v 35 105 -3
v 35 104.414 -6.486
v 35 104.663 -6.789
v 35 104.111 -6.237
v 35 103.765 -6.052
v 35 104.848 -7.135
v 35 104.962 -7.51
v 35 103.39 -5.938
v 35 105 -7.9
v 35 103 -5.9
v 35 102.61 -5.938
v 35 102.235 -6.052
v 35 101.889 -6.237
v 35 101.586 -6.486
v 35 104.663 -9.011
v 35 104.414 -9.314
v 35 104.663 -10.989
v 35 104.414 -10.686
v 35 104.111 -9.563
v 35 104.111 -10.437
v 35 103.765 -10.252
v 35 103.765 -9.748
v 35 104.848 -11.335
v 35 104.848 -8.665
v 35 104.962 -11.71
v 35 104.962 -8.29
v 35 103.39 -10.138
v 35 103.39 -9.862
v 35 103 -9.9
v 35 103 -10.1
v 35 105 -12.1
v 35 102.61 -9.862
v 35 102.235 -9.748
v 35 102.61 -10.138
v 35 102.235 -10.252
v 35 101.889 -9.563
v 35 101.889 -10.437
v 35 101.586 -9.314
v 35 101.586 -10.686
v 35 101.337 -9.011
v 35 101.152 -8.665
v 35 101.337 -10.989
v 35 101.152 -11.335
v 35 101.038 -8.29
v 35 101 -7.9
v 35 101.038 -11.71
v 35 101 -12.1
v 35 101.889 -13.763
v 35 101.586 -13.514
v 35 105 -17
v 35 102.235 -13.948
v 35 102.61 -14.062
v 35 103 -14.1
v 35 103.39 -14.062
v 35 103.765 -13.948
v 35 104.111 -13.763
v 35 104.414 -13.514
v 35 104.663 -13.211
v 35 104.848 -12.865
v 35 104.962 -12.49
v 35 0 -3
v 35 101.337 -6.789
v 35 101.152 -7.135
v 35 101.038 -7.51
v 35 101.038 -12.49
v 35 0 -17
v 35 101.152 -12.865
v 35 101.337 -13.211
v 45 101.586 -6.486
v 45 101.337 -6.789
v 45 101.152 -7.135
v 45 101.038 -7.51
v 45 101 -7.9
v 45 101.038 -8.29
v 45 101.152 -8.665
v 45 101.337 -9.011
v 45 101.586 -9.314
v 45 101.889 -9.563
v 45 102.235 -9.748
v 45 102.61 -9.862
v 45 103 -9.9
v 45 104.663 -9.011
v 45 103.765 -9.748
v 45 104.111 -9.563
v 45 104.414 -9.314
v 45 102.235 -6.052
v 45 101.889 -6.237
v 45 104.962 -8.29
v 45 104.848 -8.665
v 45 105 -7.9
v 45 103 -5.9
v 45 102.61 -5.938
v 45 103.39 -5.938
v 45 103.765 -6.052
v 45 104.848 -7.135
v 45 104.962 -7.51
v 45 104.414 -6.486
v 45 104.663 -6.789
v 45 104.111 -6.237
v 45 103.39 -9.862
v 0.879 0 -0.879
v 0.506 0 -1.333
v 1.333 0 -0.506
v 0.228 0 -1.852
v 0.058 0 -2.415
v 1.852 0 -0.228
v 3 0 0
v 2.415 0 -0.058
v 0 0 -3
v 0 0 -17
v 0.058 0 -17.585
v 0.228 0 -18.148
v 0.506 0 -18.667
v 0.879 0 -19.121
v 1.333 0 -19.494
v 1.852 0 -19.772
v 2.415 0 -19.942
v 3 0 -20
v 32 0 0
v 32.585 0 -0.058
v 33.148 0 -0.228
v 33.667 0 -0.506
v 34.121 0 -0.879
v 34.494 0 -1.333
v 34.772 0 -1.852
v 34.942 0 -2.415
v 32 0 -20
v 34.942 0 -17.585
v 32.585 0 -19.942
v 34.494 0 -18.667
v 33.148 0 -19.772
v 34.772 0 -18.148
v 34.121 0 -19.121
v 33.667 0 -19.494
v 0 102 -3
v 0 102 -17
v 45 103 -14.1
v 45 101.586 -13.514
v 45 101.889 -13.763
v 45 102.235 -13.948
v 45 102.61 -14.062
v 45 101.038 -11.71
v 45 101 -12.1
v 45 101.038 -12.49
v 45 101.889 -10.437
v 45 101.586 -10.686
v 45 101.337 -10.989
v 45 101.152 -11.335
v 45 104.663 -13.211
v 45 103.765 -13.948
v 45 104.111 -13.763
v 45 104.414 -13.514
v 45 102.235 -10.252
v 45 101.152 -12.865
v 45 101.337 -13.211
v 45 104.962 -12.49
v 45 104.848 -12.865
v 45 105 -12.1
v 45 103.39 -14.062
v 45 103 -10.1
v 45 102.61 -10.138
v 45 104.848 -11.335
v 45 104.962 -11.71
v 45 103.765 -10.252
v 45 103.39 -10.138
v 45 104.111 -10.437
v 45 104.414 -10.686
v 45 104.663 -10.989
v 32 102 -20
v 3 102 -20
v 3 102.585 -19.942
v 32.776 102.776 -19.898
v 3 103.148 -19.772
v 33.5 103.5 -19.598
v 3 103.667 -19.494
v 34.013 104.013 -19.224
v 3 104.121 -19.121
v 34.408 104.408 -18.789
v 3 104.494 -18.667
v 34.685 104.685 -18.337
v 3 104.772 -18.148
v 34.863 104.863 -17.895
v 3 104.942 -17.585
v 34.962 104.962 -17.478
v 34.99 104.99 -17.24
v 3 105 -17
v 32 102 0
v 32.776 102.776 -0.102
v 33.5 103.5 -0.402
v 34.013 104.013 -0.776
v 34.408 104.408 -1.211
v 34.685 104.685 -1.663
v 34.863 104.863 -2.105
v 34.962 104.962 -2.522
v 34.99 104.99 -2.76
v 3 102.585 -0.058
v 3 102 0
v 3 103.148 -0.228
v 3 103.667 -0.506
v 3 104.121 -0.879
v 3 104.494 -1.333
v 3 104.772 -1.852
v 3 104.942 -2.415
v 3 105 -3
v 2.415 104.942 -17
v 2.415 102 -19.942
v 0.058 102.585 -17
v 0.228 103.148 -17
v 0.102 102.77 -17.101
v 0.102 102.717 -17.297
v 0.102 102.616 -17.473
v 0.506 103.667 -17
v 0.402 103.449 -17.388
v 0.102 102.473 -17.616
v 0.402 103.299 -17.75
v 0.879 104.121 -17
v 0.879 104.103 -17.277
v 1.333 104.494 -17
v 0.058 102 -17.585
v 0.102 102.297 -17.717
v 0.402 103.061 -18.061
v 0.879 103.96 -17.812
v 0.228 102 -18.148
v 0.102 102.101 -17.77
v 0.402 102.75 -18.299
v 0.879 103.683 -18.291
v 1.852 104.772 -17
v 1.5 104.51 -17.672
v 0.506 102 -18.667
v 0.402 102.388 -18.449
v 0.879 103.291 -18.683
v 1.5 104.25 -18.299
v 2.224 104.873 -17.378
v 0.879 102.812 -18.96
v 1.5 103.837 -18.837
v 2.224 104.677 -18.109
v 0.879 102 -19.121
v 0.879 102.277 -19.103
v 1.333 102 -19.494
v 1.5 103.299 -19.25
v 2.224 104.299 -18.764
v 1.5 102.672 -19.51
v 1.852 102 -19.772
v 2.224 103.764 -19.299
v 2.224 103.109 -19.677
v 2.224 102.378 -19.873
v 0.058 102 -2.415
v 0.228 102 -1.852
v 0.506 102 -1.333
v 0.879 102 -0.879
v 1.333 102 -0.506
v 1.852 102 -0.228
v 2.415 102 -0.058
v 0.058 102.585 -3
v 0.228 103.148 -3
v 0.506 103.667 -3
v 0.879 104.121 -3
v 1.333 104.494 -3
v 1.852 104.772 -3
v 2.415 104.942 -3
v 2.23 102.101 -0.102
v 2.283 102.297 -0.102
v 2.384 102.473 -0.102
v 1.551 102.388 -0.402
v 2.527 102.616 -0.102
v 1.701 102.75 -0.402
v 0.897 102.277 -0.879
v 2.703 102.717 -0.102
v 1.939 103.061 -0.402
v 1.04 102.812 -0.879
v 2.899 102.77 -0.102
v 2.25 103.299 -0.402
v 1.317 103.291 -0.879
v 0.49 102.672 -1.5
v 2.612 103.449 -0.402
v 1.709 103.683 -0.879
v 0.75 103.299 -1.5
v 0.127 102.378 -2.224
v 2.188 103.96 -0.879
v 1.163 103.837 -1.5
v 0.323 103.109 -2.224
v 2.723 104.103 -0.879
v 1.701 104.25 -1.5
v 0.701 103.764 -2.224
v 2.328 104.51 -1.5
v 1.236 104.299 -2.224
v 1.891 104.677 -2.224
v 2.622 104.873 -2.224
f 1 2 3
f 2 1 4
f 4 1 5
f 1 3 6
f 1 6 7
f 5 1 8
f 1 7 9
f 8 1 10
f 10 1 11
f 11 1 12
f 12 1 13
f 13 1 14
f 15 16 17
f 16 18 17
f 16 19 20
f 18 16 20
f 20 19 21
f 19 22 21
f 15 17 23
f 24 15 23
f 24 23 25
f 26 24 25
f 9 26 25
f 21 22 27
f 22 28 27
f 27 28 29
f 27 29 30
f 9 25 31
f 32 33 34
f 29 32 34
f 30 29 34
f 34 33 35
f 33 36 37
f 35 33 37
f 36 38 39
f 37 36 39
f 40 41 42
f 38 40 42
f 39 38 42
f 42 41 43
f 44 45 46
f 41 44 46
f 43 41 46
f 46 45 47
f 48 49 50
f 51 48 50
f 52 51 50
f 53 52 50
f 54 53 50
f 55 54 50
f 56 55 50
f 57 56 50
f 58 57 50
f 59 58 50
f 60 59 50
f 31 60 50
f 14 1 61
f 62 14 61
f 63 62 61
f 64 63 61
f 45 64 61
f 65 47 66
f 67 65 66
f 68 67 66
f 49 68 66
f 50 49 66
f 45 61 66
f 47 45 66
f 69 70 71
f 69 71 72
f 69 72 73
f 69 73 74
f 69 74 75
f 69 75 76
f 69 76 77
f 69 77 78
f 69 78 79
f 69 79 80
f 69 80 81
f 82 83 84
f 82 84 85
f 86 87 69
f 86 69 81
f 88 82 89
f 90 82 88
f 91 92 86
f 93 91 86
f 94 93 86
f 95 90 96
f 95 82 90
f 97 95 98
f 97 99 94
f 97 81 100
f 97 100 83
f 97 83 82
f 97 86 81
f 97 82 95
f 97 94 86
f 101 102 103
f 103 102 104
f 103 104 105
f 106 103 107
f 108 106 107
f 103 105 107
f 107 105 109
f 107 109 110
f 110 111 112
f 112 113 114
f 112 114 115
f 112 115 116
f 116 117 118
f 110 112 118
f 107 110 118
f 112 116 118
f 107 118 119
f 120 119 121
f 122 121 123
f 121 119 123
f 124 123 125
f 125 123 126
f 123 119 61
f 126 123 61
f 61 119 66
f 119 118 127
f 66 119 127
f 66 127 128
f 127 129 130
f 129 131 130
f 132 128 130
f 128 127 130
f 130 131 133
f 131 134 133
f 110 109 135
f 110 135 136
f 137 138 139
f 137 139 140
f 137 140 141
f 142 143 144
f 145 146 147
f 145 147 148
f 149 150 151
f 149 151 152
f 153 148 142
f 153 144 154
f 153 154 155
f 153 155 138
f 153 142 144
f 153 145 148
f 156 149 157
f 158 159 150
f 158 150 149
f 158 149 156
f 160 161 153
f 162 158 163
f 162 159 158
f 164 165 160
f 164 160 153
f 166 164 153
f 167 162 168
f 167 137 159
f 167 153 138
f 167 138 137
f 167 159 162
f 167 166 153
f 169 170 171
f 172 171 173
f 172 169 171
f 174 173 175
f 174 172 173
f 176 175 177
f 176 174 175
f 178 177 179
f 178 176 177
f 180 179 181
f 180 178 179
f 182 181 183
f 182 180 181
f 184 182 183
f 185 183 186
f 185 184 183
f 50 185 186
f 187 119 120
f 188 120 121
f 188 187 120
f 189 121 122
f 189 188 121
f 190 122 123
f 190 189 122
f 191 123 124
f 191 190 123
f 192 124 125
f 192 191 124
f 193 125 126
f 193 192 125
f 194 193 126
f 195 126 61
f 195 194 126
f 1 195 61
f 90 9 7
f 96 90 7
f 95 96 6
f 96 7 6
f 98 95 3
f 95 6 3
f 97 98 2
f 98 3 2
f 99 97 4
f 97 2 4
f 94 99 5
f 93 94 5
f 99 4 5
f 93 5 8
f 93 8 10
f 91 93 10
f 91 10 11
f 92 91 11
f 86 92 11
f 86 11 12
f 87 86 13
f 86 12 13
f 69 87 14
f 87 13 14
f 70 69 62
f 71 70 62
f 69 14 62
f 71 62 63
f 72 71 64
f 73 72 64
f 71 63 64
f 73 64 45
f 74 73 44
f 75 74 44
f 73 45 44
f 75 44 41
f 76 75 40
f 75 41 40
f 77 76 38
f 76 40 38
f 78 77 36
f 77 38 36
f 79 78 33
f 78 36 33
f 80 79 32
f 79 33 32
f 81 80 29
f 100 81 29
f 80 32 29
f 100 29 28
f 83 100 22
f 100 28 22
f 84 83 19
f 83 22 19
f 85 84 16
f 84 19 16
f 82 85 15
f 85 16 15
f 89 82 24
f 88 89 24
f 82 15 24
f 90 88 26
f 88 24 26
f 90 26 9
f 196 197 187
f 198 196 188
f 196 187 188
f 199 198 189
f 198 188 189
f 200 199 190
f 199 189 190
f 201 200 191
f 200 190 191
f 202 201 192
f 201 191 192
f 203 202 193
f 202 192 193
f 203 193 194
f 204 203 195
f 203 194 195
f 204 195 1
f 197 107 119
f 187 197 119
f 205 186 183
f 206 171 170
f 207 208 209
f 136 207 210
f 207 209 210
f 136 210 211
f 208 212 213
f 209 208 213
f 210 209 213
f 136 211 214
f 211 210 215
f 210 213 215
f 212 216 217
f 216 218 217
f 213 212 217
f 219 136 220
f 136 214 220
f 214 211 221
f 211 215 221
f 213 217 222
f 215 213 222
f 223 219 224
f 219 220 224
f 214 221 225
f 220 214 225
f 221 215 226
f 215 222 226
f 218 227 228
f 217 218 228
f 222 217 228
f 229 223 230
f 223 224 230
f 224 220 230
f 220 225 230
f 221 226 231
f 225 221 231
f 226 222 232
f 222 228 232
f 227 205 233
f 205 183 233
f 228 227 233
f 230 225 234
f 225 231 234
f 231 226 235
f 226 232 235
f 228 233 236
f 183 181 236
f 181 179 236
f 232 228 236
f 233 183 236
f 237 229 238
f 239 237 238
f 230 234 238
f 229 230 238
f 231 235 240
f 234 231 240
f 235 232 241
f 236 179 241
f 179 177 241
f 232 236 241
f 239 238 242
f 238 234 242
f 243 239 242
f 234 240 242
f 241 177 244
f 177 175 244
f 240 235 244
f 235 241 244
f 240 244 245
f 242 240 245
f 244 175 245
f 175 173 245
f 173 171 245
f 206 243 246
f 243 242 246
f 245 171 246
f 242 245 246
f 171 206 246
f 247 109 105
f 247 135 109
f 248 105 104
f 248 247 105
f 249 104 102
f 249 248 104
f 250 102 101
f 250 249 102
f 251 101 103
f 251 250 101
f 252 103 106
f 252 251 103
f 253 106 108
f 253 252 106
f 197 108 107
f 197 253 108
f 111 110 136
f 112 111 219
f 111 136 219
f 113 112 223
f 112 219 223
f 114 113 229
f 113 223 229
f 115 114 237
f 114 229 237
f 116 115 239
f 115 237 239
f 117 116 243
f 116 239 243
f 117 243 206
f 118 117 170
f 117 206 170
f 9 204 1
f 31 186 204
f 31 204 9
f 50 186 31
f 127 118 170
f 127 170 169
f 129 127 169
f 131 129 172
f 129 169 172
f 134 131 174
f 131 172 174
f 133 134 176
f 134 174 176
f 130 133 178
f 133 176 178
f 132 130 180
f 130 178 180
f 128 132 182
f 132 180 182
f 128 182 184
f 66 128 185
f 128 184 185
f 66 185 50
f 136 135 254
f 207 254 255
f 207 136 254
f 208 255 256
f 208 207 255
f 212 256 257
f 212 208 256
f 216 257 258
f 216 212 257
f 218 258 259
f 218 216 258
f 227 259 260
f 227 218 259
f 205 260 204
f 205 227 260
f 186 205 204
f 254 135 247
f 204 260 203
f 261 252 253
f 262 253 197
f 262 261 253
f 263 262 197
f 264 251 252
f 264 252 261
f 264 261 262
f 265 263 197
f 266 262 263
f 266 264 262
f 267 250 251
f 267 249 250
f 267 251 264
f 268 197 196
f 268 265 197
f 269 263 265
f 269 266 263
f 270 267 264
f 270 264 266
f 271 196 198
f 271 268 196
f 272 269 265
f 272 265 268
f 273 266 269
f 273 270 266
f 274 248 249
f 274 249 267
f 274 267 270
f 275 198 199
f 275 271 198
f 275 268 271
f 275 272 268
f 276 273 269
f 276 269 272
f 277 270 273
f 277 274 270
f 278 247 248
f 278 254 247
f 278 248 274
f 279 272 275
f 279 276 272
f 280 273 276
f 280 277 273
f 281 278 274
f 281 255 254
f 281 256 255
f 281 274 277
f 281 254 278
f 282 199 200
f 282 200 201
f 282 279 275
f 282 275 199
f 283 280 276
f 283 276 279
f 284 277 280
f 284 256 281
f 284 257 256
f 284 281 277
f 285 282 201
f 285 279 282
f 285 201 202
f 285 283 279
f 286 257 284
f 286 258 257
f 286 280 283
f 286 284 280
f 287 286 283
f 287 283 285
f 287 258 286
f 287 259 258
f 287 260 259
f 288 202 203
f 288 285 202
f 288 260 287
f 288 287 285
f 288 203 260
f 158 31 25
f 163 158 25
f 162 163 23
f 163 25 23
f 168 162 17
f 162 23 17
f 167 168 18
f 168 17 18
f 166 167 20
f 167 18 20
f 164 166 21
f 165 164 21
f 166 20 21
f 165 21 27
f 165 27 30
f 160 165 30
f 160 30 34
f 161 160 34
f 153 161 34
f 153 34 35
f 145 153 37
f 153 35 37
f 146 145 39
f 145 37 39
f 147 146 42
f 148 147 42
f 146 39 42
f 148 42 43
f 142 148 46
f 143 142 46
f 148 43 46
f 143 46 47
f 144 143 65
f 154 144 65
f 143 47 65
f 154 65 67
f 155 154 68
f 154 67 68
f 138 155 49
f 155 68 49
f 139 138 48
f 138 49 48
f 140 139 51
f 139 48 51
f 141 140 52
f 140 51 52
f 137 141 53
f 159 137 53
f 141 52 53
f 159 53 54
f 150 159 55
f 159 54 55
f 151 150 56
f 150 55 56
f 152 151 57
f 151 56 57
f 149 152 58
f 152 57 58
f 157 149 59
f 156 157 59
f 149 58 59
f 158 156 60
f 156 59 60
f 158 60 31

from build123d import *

# Parameters (mm, degrees)
SKETCH2_W           = 35
SKETCH2_H           = 20
BOSS_EXTRUDE1_DEPTH = 105
SKETCH5_R           = 2
BOSS_EXTRUDE2_DEPTH = 10
FILLET1_R           = 3


with BuildPart() as part:
    # Sketch2 → Boss-Extrude1 (new body)
    with BuildSketch(Plane(origin=(0, 0, 0), x_dir=(1, 0, 0), z_dir=(0, 1, 0))):
        with Locations((17.5, 10)):
            Rectangle(SKETCH2_W, SKETCH2_H)
    extrude(amount=BOSS_EXTRUDE1_DEPTH)

    # Sketch5 → Boss-Extrude2 (add)
    with BuildSketch(Plane(origin=(35, 0, 0), x_dir=(0, 0, -1), z_dir=(1, 0, 0))):
        with Locations(Location((7.9, 103, 0), (0, 0, 90))):
            Circle(SKETCH5_R)
        with Locations(Location((12.1, 103, 0), (0, 0, 90))):
            Circle(SKETCH5_R)
    extrude(amount=BOSS_EXTRUDE2_DEPTH)

    # Fillet1
    fillet1_edges = [part.edges().sort_by_distance(p)[0] for p in [
        (17.5, 105, -20),
        (0, 105, -10),
        (0, 52.5, -20),
        (35, 52.5, -20),
        (35, 52.5, 0),
        (0, 52.5, 0),
        (17.5, 105, 0),
    ]]
    fillet(fillet1_edges, radius=FILLET1_R)


solid = part.part
